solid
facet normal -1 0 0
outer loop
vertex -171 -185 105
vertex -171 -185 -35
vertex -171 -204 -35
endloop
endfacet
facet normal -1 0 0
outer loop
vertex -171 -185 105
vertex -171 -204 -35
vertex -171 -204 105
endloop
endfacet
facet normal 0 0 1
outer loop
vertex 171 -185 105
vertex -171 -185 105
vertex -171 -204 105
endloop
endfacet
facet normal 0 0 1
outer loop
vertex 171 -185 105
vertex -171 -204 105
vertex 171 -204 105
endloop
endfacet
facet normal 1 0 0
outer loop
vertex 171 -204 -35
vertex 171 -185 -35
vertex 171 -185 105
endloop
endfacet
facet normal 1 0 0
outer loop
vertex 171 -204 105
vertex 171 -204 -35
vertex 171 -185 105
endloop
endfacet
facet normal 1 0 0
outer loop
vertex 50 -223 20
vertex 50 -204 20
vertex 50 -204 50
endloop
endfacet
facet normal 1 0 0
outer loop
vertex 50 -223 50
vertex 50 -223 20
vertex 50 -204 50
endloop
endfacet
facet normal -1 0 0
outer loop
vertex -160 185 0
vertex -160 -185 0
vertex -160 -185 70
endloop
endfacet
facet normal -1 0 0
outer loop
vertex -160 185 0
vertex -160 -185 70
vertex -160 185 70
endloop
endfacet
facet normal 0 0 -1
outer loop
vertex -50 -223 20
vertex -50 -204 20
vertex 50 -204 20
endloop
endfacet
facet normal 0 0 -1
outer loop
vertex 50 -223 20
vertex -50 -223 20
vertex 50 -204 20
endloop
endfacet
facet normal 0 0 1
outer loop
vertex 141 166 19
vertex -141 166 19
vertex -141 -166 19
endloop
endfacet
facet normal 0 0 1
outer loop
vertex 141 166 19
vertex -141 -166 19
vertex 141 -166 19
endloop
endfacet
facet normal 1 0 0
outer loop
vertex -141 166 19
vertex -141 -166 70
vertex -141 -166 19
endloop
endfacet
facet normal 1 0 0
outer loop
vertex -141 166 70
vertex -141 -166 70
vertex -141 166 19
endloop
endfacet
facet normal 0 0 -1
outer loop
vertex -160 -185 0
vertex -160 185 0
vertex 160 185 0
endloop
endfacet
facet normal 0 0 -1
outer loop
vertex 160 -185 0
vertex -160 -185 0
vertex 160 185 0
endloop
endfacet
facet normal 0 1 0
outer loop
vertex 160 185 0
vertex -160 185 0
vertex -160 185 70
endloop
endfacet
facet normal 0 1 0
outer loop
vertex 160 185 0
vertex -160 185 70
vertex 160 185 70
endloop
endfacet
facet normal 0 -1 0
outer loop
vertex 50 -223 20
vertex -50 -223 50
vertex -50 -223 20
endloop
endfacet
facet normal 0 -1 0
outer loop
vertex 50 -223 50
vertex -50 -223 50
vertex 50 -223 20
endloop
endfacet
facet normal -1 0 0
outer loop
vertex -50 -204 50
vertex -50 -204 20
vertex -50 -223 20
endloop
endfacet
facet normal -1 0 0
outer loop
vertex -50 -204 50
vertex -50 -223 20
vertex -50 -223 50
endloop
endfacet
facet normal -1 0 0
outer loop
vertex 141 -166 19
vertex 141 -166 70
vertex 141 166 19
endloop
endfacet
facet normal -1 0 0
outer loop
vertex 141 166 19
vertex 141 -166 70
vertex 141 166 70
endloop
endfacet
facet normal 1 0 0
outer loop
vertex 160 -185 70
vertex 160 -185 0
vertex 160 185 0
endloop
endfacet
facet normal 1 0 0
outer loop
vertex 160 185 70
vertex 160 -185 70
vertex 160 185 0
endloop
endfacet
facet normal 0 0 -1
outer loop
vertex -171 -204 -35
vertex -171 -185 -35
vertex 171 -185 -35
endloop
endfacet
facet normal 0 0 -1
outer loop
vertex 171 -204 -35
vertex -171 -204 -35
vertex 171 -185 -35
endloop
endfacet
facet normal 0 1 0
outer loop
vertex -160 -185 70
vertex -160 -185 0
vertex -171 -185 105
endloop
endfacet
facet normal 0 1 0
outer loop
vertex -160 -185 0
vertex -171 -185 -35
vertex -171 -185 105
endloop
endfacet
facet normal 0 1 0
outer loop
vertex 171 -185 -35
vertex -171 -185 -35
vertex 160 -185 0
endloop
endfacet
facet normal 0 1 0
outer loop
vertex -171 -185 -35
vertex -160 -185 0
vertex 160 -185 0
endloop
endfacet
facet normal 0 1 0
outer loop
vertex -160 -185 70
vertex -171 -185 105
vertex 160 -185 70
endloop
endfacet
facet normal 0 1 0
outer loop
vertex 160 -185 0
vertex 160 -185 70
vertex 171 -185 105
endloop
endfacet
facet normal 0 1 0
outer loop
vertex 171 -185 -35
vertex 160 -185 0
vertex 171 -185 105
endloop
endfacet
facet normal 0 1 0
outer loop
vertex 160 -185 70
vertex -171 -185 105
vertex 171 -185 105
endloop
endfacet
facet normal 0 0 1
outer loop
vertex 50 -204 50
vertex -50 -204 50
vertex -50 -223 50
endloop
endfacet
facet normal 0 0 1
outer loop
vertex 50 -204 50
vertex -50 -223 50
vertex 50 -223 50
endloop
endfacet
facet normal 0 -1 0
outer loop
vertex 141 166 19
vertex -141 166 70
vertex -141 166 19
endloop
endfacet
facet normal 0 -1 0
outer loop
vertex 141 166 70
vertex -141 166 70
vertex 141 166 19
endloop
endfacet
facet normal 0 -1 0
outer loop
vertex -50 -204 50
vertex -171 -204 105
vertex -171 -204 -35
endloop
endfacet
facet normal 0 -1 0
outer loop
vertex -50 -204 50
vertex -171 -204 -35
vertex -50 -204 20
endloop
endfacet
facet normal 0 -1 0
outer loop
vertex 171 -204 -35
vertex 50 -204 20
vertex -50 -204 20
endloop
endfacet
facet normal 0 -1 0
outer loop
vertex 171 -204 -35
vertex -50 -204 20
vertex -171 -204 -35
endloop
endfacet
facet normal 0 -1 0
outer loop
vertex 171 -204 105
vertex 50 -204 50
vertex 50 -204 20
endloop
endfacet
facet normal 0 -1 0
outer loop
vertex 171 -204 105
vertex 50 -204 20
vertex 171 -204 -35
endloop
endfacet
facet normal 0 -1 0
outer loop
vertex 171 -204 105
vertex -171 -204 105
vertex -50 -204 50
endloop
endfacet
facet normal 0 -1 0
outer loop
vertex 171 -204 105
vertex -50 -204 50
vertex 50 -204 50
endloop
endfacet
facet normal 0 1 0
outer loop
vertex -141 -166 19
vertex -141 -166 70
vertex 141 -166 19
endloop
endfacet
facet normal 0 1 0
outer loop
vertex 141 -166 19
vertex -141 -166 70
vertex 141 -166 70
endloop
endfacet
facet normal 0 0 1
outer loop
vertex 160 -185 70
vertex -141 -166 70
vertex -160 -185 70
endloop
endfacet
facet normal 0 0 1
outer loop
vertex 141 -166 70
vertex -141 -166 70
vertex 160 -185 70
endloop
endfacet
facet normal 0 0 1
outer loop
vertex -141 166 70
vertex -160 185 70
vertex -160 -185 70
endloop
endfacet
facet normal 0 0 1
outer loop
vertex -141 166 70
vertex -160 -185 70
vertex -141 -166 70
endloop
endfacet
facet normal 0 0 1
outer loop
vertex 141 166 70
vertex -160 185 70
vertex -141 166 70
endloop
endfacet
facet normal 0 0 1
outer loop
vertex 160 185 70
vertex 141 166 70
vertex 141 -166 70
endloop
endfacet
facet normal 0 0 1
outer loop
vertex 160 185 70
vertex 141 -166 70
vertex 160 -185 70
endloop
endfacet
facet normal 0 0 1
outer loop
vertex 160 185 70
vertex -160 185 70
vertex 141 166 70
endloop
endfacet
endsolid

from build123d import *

# Parameters (mm, degrees)
F0_W     = 320
F0_H     = 370
F1_DEPTH = 70
F2_W     = 282
F2_H     = 332
F3_DEPTH = 51
F4_W     = 342
F4_H     = 140
F4_W_2   = 320
F4_H_2   = 70
F5_DEPTH = 19
F6_W     = 100
F6_H     = 30
F7_DEPTH = 19


with BuildPart() as f1:
    # F0 (on Top) → F1 (new body)
    with BuildSketch(Plane.XY):
        Rectangle(F0_W, F0_H)
    extrude(amount=F1_DEPTH)

    # F2 (on face) → F3 (cut)
    with BuildSketch(Plane.XY.offset(70)):
        Rectangle(F2_W, F2_H)
    extrude(amount=-F3_DEPTH, mode=Mode.SUBTRACT)

    # F4 (on face) → F5 (join)
    with BuildSketch(Plane.XZ.offset(185)):
        with Locations((0, 35)):
            Rectangle(F4_W, F4_H)
        with Locations((0, 35)):
            Rectangle(F4_W_2, F4_H_2, mode=Mode.SUBTRACT)
        with Locations((0, 35)):
            Rectangle(F4_W_2, F4_H_2)
    extrude(amount=F5_DEPTH)

    # F6 (on face) → F7 (join)
    with BuildSketch(Plane.XZ.offset(204)):
        with Locations((0, 35)):
            Rectangle(F6_W, F6_H)
    extrude(amount=F7_DEPTH)


solid = f1.part
